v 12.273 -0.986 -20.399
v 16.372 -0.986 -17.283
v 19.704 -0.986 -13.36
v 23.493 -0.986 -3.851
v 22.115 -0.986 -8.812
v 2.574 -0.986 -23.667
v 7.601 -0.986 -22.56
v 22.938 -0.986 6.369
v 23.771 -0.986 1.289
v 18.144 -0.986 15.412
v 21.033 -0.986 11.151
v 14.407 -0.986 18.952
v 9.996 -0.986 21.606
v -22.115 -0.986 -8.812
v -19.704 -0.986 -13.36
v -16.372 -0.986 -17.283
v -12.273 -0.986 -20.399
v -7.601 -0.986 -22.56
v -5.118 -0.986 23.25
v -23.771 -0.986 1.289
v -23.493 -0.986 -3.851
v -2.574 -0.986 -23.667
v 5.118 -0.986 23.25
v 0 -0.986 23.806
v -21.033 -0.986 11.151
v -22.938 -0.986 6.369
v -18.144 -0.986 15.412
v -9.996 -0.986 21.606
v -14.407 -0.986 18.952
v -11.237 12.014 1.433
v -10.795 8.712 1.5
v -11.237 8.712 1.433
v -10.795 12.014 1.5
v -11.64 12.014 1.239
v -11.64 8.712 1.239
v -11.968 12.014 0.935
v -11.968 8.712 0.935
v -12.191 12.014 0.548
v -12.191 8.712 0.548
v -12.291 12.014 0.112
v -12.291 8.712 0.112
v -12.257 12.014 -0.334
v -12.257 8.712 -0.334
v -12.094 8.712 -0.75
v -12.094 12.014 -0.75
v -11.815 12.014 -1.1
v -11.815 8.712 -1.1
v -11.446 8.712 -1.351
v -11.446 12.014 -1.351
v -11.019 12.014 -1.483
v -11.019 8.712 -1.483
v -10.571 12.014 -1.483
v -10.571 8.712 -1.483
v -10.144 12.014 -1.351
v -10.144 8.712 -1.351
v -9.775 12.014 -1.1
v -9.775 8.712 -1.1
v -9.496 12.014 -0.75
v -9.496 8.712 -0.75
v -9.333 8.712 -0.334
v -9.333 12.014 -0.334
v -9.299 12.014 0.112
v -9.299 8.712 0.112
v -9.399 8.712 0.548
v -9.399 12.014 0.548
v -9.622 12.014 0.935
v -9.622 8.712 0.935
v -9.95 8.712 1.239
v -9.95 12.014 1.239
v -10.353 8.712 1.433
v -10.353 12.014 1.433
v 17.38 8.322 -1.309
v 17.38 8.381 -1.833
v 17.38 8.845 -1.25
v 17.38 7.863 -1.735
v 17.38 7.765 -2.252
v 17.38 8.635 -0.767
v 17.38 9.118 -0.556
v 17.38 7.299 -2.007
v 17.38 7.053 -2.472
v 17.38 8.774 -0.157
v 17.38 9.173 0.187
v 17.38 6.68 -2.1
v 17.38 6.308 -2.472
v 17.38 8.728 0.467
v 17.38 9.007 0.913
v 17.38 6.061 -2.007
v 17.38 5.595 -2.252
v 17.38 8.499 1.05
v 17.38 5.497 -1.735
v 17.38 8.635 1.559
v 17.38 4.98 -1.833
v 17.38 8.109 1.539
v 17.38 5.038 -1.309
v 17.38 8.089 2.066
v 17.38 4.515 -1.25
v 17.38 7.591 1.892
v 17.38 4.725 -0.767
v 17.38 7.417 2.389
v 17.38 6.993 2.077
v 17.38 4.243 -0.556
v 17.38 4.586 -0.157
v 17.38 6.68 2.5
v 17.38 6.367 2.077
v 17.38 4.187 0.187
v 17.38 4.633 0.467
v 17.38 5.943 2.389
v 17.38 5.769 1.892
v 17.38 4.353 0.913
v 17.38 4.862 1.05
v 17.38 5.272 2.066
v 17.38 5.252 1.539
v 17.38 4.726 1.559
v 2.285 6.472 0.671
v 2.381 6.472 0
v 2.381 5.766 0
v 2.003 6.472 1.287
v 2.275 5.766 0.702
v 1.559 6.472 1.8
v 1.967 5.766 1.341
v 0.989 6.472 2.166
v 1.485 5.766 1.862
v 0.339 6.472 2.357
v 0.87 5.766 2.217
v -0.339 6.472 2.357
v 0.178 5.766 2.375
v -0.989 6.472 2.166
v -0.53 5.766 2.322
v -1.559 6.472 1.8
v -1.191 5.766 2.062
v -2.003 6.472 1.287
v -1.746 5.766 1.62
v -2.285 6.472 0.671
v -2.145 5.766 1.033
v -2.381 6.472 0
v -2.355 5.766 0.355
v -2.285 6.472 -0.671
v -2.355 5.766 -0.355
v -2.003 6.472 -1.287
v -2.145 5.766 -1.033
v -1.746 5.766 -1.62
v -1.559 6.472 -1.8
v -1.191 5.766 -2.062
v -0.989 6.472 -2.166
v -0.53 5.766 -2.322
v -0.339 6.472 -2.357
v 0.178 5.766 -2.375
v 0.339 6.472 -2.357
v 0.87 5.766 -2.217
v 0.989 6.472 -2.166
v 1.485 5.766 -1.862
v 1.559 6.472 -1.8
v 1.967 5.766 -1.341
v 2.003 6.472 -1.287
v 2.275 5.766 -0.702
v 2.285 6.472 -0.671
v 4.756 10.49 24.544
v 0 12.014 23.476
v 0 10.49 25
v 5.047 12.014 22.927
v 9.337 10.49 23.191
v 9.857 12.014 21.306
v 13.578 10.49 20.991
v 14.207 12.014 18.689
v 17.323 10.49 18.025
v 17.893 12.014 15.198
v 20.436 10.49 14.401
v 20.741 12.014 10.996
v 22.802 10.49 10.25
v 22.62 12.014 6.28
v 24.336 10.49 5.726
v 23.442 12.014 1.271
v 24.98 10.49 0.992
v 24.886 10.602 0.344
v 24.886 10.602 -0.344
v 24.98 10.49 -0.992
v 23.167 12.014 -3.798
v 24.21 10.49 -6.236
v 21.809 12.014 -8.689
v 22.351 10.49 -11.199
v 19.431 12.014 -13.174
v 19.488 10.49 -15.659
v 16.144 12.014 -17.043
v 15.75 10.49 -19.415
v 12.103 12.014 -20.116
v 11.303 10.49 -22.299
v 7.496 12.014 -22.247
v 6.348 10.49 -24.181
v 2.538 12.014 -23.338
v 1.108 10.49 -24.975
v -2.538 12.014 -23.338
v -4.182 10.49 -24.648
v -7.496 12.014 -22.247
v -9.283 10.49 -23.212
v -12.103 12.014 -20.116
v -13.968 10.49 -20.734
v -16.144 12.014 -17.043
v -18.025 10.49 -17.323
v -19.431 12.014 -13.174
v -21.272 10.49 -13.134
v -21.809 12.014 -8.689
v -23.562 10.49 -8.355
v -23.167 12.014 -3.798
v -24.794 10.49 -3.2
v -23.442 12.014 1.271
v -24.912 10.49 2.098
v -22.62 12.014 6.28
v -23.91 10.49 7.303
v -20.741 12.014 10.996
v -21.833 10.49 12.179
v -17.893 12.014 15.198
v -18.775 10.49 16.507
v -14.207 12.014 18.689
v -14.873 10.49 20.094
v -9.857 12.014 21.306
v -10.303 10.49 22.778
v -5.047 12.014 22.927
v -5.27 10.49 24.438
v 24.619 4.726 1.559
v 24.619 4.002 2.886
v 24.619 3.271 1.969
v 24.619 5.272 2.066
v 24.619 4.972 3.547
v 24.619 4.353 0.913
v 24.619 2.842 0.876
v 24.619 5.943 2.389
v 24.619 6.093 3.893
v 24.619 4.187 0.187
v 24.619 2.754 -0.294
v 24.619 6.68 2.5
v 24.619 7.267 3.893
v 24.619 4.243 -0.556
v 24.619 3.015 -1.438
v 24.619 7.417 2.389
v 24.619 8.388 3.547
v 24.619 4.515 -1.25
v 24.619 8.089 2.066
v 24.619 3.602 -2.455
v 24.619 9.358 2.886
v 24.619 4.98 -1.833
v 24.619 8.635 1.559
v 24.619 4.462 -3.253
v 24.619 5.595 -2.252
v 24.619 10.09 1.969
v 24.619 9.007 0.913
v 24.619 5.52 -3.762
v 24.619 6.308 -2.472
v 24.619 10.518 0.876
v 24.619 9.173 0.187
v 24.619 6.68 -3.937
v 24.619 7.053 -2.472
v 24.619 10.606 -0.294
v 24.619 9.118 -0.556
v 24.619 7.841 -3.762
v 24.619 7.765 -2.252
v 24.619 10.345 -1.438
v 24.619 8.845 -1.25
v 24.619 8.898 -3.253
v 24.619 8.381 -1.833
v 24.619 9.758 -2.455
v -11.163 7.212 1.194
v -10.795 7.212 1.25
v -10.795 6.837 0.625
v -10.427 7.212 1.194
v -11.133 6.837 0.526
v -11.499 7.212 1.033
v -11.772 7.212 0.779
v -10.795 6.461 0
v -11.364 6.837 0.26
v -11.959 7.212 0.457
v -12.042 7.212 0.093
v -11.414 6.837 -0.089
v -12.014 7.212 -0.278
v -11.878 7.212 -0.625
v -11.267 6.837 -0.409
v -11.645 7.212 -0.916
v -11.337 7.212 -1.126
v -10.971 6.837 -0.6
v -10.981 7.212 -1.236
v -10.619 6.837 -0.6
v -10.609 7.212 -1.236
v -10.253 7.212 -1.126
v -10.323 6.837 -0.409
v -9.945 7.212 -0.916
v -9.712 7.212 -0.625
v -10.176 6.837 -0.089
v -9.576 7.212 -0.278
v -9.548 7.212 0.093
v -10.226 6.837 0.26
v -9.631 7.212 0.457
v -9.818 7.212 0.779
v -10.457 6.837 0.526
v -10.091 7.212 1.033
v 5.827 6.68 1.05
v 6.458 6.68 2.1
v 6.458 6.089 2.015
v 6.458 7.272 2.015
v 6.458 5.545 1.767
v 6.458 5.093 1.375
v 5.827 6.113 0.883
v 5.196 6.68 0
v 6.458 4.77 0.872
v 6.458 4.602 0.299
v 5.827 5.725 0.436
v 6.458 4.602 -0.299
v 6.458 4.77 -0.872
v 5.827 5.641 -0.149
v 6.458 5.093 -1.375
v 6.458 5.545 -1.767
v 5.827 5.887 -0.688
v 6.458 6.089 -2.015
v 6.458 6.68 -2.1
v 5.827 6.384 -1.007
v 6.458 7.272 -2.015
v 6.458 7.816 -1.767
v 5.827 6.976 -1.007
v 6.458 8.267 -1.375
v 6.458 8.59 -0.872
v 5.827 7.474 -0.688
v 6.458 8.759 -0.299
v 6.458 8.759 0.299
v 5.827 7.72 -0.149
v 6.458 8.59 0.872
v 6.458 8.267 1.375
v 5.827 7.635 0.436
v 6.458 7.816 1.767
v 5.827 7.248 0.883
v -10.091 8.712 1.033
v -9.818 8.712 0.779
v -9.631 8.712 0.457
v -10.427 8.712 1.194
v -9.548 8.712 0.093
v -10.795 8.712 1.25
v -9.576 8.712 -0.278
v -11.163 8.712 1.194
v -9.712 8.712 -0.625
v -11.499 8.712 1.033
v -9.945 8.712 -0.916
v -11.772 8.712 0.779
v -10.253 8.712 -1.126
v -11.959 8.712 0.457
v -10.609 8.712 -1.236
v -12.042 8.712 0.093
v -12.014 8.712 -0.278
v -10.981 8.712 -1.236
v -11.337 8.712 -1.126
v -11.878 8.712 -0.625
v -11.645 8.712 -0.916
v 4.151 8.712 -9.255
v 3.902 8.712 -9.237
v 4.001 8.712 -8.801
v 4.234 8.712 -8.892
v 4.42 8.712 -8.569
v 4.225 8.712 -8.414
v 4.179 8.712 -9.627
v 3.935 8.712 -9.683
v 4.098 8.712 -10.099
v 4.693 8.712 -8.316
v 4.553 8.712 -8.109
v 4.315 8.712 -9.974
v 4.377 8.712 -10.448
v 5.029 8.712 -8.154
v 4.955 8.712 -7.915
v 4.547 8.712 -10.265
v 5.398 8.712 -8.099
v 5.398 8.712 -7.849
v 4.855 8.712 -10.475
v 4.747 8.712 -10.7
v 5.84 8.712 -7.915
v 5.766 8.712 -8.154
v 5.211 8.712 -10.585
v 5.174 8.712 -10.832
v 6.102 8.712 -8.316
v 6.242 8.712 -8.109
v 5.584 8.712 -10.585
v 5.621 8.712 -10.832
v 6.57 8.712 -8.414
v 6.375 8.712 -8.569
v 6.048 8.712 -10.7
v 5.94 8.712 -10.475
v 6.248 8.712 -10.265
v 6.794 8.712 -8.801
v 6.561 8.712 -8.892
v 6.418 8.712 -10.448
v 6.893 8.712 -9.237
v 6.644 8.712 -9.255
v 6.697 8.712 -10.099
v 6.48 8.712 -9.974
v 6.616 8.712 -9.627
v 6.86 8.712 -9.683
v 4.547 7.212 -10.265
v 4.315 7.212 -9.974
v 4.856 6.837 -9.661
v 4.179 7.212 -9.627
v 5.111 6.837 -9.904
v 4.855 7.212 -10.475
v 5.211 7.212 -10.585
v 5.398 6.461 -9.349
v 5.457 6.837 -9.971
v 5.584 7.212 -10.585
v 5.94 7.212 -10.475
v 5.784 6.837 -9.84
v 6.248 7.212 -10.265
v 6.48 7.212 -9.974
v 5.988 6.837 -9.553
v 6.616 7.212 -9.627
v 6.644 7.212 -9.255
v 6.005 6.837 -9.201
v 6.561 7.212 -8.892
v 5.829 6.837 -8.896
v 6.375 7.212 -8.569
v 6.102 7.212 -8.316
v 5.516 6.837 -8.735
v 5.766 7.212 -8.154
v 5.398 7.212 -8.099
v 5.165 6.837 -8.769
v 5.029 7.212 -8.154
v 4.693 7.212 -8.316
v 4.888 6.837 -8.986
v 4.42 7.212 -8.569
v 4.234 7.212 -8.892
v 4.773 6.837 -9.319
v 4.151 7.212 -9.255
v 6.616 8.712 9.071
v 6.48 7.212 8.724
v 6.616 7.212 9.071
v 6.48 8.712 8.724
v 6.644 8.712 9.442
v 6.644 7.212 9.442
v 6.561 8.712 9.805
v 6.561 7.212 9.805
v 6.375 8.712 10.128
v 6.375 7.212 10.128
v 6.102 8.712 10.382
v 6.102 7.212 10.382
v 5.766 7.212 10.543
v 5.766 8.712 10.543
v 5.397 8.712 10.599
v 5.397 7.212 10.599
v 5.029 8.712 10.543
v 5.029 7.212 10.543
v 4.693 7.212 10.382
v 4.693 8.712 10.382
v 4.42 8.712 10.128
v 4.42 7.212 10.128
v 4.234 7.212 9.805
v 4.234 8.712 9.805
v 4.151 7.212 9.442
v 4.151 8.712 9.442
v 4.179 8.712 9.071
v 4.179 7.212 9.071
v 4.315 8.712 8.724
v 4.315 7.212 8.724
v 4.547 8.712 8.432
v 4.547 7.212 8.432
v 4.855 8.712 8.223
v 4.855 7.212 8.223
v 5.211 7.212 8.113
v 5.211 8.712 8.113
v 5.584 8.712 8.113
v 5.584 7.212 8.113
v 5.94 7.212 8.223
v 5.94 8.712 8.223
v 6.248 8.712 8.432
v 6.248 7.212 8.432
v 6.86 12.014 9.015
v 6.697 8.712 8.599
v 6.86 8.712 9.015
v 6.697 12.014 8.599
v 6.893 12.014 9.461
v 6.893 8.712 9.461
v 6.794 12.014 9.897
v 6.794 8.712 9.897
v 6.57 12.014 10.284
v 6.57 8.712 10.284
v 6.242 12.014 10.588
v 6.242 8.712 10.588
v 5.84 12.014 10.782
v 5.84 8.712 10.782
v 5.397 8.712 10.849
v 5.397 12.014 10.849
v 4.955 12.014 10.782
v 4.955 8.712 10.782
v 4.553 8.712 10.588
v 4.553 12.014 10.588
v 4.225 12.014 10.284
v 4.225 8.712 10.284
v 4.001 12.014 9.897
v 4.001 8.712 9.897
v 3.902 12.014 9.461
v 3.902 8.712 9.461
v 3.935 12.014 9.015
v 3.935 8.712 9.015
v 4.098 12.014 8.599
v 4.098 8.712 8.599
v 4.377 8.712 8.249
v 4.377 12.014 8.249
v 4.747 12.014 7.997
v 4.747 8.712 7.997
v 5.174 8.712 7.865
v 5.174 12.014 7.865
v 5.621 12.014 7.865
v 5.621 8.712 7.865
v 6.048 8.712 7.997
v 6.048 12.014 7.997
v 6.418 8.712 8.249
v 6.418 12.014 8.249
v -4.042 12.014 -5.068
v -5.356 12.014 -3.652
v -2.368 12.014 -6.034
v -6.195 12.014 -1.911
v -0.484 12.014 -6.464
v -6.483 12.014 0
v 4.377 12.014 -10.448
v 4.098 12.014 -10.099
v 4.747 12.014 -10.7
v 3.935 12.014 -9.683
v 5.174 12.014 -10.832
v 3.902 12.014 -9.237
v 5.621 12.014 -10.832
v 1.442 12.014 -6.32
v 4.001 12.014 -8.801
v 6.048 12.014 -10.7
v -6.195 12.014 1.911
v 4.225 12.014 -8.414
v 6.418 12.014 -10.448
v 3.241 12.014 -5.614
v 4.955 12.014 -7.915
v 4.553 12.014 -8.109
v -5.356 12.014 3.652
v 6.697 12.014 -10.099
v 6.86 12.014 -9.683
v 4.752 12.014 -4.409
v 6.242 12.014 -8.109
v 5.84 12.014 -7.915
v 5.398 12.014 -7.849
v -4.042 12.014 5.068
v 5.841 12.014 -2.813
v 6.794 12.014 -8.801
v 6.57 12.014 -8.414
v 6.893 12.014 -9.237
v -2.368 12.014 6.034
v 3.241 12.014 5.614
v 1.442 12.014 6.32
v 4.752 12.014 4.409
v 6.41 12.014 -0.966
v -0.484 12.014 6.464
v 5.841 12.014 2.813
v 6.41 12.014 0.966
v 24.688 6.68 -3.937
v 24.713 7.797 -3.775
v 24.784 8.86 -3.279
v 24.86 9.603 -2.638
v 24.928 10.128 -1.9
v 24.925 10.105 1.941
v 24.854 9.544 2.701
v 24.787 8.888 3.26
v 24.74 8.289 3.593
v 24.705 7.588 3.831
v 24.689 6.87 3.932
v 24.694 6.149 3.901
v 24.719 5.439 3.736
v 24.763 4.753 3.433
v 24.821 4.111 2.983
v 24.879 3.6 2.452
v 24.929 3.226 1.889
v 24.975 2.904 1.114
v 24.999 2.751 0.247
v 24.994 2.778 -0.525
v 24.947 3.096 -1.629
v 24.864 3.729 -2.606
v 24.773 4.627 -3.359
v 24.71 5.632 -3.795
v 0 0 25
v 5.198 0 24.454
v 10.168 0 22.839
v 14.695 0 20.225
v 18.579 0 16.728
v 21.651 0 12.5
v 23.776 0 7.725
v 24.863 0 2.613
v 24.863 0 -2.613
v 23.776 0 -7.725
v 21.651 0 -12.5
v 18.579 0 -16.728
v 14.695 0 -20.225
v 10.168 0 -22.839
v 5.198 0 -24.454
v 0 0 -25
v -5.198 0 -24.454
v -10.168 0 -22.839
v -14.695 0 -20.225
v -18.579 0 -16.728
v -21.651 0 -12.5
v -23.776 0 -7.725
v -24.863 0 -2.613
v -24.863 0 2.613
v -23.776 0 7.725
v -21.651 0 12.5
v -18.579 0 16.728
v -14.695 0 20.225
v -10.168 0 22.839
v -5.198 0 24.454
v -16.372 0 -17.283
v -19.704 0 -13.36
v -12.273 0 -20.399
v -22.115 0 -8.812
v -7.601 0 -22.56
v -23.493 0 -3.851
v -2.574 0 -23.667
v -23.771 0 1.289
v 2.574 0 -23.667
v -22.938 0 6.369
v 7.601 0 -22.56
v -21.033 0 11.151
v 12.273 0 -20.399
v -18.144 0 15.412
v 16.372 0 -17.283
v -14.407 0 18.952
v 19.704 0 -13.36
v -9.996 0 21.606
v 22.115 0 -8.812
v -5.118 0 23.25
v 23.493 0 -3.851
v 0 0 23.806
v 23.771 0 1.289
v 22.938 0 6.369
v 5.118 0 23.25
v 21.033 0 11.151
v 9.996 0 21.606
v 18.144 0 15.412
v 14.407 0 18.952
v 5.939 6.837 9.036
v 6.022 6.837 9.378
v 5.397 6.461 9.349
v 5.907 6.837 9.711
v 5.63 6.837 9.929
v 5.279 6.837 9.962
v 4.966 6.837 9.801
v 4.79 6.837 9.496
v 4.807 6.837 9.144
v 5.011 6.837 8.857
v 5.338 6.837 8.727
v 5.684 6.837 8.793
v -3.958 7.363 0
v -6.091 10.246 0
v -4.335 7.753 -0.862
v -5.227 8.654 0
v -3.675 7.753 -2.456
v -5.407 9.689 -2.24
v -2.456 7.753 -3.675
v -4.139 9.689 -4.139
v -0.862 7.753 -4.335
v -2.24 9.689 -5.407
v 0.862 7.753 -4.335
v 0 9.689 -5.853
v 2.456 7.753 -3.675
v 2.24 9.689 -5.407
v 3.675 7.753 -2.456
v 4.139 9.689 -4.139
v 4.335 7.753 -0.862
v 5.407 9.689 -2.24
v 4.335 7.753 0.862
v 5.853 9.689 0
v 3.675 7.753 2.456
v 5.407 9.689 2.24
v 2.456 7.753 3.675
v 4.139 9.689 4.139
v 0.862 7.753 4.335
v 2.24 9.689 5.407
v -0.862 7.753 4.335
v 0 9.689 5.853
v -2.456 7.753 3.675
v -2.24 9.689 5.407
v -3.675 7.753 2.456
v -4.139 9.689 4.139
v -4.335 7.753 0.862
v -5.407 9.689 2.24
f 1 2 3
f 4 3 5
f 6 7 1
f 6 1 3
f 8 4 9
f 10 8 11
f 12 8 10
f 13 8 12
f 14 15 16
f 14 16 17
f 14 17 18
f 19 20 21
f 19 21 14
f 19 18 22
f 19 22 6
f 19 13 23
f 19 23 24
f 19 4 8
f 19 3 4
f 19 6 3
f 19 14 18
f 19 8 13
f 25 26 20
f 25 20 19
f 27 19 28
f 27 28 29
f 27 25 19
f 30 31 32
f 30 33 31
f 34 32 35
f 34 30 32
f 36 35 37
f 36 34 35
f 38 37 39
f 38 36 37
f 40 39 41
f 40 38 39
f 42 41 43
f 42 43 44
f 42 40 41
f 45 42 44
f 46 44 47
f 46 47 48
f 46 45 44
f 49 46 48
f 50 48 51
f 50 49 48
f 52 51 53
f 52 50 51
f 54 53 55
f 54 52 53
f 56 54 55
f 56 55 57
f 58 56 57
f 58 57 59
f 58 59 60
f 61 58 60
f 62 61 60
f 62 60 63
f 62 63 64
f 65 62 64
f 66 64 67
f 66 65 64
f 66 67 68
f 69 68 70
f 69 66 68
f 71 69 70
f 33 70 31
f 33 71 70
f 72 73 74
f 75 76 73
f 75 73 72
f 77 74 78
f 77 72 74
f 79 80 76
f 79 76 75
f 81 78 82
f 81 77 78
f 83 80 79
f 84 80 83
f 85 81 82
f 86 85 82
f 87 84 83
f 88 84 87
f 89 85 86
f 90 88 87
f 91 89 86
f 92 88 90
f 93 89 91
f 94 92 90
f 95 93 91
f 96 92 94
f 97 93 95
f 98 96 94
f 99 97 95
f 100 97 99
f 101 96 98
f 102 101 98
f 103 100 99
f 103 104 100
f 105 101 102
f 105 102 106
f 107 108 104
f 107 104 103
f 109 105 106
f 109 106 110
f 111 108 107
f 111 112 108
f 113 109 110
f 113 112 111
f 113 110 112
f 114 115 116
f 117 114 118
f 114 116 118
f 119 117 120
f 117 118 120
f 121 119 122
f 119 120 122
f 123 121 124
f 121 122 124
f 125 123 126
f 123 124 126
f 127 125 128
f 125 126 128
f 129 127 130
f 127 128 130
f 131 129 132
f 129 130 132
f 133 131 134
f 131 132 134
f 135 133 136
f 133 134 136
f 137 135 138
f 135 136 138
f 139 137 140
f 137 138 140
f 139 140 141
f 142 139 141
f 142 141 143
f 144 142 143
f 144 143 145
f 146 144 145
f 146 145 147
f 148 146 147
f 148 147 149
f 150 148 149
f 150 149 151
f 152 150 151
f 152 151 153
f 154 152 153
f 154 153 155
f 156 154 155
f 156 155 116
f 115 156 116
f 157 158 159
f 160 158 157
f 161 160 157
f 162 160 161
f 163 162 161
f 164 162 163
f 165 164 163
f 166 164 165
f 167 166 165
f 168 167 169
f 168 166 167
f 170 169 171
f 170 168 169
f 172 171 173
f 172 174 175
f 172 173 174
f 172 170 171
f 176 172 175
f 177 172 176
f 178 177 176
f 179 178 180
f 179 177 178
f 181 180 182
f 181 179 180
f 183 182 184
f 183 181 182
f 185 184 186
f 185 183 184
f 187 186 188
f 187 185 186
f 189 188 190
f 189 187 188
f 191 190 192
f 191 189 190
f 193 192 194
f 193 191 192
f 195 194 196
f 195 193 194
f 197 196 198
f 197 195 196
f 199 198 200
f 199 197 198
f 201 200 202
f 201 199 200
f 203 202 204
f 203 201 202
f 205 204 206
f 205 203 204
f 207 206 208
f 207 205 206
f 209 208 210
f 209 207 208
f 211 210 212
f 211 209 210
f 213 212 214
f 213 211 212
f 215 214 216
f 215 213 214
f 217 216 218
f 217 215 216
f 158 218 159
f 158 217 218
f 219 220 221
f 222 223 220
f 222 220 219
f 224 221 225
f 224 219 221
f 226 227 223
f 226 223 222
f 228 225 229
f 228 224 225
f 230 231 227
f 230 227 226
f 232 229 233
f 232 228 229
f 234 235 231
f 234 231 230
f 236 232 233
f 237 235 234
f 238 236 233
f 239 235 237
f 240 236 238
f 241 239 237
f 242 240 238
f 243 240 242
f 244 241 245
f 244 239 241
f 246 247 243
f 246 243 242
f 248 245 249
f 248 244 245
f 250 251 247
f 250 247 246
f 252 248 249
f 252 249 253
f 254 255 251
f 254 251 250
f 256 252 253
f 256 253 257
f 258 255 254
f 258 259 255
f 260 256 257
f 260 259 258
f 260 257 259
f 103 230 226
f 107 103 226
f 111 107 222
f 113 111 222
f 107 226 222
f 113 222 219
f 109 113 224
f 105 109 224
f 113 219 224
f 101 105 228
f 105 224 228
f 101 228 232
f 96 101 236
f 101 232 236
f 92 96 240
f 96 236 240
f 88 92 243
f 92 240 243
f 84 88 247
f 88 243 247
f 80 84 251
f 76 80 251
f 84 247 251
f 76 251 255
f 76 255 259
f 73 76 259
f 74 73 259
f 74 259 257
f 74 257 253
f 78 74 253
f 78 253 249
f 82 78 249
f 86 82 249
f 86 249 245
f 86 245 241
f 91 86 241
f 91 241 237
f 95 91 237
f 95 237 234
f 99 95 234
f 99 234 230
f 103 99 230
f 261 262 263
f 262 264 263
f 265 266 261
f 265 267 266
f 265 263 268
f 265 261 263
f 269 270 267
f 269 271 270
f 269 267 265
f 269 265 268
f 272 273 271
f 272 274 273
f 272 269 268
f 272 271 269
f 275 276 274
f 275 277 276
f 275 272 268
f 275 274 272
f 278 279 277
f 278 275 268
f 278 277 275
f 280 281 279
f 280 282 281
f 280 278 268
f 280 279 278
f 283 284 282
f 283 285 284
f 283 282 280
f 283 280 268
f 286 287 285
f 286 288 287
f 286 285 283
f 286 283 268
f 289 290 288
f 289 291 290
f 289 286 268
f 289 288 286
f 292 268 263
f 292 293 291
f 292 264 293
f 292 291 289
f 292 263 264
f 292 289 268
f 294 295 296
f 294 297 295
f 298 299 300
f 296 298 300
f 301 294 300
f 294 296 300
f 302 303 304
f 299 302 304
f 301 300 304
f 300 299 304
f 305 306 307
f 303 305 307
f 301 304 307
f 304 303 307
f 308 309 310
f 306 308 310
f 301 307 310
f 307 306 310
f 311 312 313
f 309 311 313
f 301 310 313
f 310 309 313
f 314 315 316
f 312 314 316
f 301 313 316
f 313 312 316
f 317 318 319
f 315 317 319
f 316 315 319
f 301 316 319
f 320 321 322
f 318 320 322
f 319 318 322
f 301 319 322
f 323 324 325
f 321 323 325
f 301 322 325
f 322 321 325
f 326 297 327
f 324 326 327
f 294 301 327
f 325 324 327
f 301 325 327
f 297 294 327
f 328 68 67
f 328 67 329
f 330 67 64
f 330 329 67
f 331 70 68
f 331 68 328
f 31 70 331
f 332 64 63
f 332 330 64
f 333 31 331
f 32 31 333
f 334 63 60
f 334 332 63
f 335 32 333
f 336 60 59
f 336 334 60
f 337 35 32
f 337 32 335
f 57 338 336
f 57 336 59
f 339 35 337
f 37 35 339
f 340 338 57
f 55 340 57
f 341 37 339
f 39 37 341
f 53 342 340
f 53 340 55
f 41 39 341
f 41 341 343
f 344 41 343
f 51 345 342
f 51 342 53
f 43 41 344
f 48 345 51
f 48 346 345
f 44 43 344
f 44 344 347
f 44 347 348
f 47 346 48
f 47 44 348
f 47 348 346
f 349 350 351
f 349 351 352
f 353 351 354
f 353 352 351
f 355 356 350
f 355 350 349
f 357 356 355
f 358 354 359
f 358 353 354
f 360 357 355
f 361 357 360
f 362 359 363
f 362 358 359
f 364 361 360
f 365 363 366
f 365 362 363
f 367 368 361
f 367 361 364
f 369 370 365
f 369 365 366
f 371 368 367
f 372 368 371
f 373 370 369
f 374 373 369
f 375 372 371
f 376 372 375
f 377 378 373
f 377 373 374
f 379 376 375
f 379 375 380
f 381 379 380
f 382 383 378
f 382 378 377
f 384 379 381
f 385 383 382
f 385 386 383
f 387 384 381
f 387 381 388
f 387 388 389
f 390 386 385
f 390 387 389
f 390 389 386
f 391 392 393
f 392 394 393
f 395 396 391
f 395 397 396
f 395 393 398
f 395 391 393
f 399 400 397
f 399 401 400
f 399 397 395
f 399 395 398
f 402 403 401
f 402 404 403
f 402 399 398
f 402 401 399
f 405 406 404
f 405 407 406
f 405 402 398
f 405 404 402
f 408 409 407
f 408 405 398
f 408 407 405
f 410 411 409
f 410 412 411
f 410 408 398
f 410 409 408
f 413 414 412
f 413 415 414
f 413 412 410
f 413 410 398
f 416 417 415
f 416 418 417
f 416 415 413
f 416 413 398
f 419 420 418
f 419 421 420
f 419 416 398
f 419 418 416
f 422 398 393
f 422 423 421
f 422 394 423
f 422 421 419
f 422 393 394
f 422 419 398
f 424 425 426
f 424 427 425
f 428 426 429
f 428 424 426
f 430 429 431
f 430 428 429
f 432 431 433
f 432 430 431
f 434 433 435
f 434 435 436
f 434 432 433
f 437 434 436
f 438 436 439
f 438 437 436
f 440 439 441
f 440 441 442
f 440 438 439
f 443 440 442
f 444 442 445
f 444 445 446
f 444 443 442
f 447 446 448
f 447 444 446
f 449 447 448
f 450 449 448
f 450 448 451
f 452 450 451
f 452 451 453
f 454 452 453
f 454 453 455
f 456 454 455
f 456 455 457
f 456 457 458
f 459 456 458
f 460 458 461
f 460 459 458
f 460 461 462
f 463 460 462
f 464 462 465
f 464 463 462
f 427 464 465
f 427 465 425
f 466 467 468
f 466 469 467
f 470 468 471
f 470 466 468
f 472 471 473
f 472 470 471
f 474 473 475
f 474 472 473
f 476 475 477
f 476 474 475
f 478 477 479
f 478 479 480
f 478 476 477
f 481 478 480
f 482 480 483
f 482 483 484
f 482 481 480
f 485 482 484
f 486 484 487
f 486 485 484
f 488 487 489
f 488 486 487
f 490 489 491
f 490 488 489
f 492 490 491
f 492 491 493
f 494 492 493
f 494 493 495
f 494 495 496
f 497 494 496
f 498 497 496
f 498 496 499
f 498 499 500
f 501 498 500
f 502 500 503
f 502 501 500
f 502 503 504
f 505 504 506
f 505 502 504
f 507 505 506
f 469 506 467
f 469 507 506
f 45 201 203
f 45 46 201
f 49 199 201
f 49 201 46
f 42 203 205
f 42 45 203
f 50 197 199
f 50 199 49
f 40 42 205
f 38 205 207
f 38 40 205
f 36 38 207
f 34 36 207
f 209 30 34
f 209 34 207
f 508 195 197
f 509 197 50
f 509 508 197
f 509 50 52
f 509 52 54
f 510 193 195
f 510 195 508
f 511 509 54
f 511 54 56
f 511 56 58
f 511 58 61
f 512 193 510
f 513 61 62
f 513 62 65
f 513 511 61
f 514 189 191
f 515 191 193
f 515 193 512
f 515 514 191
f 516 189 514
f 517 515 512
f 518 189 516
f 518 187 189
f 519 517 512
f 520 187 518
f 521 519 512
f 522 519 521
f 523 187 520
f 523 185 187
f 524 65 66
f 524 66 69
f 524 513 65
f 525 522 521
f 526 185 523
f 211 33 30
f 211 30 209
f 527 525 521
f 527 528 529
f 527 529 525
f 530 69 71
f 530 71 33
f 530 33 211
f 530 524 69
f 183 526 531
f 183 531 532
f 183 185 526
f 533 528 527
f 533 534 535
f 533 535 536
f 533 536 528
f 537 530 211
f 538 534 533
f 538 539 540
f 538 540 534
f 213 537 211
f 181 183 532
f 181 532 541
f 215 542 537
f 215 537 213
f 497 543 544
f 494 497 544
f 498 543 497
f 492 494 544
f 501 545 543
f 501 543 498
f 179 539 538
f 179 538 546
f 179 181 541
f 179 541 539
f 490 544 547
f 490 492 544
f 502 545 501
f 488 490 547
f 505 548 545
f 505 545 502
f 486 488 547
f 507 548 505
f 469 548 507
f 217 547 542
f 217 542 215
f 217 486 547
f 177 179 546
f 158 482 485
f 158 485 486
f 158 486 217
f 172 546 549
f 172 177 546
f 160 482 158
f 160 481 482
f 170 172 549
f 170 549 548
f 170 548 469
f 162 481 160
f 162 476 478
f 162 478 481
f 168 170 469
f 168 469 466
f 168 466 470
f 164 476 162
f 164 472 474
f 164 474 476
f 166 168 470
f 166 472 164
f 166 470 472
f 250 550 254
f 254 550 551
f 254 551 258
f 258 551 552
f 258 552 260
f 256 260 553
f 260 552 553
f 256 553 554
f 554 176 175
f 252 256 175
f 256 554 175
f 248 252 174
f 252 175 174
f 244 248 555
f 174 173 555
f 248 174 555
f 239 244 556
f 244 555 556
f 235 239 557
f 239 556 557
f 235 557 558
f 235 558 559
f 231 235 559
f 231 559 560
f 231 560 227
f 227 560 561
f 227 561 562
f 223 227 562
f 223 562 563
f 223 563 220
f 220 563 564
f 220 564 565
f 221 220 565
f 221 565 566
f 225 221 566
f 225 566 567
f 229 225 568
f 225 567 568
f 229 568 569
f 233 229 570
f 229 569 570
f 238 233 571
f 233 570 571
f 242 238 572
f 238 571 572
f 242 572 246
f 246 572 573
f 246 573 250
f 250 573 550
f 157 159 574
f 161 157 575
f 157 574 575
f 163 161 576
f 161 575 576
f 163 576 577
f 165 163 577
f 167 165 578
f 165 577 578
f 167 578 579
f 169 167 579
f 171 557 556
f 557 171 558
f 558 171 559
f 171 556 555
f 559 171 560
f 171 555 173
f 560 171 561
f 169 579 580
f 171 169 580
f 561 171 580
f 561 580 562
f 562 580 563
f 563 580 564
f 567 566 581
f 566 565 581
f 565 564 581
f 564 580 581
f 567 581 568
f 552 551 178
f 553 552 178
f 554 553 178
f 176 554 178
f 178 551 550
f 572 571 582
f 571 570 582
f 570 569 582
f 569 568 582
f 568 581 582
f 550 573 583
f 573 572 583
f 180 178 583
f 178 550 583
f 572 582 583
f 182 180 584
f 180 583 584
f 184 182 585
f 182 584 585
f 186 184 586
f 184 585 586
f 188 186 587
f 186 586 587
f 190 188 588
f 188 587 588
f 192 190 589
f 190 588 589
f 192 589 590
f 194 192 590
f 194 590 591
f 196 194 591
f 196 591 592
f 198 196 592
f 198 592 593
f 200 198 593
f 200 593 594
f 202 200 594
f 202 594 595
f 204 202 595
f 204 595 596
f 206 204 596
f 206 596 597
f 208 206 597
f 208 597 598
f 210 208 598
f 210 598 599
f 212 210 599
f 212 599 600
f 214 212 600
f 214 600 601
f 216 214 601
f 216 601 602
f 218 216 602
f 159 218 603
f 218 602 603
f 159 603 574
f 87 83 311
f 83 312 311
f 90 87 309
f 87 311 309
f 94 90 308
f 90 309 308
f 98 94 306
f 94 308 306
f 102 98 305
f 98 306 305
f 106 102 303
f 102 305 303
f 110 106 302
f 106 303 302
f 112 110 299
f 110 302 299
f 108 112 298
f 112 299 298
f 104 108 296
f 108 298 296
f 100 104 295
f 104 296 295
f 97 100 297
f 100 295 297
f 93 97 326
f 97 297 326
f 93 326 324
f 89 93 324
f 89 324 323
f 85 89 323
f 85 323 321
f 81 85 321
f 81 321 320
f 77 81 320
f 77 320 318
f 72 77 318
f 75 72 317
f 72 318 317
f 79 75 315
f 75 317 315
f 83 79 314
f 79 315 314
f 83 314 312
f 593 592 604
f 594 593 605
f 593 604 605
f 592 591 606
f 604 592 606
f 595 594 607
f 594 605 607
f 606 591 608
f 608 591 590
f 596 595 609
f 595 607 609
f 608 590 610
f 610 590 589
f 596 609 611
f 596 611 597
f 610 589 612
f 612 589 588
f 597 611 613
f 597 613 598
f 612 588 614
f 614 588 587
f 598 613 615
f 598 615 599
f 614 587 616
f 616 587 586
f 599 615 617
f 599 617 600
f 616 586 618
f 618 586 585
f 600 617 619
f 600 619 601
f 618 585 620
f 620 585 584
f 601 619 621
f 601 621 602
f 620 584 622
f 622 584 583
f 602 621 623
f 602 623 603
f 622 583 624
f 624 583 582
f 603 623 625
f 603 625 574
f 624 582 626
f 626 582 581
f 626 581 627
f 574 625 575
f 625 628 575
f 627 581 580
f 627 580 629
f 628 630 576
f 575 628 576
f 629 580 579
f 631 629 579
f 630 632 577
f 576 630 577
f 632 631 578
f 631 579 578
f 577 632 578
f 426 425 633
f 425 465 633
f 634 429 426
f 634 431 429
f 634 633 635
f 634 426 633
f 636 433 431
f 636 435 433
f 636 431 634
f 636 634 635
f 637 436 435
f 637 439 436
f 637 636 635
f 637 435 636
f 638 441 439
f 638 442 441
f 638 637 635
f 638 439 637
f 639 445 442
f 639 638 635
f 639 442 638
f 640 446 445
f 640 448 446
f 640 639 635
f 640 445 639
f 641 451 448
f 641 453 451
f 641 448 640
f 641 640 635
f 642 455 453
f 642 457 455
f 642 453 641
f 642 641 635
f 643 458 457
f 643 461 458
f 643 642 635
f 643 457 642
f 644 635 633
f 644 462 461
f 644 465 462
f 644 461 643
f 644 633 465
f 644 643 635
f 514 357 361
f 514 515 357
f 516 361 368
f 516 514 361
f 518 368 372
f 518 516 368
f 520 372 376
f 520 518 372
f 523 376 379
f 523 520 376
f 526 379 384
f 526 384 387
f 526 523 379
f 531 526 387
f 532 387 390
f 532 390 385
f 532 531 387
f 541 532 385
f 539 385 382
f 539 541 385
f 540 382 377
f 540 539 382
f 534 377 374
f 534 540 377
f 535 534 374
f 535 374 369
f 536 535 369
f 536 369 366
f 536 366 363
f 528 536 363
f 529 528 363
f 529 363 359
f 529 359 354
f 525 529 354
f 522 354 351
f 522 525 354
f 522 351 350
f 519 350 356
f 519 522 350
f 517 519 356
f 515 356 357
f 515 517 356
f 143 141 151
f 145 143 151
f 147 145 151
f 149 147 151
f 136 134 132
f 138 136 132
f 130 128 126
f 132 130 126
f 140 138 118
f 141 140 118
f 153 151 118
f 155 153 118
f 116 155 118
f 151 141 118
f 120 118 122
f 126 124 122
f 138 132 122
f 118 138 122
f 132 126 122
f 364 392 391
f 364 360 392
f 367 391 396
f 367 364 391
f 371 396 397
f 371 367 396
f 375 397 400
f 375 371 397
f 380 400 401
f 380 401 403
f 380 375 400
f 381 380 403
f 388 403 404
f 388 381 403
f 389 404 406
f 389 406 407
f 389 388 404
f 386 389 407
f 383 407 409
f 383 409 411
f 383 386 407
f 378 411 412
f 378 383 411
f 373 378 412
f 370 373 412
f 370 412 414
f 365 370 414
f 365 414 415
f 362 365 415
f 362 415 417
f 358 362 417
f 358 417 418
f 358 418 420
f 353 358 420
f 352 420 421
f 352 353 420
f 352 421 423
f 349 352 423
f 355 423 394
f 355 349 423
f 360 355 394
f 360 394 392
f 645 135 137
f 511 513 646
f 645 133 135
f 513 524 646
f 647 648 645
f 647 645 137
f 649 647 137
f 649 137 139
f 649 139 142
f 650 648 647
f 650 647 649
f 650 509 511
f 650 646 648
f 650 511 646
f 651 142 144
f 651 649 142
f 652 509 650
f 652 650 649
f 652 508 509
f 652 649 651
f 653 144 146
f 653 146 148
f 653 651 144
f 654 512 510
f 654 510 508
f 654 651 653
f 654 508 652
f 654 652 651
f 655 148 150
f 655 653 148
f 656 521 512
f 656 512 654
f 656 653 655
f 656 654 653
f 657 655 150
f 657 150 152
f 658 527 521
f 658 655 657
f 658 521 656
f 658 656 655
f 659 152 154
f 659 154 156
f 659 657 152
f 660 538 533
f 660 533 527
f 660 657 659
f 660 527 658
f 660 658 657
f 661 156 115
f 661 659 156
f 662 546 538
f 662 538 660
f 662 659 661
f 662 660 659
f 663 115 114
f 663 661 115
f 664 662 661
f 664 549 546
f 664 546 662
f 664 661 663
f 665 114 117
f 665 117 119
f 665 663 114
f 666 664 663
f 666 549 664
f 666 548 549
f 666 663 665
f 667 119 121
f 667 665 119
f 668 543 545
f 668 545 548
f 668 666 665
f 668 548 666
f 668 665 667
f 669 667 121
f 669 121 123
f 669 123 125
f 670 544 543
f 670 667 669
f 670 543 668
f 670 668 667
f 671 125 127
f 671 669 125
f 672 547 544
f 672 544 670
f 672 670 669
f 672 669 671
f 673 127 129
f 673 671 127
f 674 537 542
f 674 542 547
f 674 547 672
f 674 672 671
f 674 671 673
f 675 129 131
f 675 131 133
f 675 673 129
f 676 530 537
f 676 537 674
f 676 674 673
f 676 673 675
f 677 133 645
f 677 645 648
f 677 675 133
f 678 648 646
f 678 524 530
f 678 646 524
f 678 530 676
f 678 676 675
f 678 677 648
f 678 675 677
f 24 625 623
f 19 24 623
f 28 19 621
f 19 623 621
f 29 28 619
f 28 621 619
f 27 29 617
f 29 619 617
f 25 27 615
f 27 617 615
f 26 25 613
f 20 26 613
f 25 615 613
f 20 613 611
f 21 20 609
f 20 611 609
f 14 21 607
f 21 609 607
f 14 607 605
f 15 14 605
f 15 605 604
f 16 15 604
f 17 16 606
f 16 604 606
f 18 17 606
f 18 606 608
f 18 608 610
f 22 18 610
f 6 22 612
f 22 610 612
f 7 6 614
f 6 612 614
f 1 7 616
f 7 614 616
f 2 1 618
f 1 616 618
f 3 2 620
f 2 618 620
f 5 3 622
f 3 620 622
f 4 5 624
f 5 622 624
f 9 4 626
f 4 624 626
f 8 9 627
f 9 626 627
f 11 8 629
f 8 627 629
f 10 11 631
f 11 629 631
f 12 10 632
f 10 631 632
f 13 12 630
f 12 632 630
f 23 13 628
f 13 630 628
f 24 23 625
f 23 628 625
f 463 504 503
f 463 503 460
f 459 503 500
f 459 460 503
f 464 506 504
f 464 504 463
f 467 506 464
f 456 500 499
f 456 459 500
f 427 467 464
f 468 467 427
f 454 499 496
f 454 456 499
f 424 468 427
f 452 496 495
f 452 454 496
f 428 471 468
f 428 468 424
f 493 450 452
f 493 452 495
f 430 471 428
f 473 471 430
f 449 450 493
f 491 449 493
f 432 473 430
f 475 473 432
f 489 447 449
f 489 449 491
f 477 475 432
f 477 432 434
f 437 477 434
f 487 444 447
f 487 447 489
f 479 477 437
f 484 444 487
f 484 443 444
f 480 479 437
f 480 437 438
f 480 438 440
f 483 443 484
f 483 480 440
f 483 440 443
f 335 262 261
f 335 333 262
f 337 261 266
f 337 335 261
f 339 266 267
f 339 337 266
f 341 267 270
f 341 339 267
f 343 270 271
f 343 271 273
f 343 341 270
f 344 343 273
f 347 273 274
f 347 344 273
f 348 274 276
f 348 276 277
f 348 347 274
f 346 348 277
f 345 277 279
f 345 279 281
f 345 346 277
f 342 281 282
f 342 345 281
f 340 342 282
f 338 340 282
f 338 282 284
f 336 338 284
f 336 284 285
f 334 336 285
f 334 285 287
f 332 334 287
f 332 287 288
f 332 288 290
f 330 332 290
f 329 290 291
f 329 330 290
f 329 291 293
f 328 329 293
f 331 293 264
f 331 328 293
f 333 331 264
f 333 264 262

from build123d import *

# Parameters (mm, degrees)
SKETCH1_R                          = 25
EXTRUDE1_DEPTH                     = 12.0142
CHAMFER1_SIZE                      = 1.524
F_3_16_0_1875_DIAMETER_HOLE1_D     = 4.7625
F_3_16_0_1875_DIAMETER_HOLE1_DEPTH = 6.2484
SKETCH5_R                          = 23.8062
EXTRUDE2_DEPTH                     = 0.98552
M5X0_8_TAPPED_HOLE1_D              = 4.2
M5X0_8_TAPPED_HOLE1_DEPTH          = 18.542
M5X0_8_TAPPED_HOLE1_CBORE_D        = 5
M5X0_8_TAPPED_HOLE1_CBORE_DEPTH    = 7.62
M5X0_8_TAPPED_HOLE1_TIP            = 1.2618073
CIRPATTERN1_COUNT                  = 3
SKETCH10_R                         = 3.937
CUT_EXTRUDE3_DEPTH                 = 0.381


with BuildPart() as part:
    # Sketch1 → Extrude1 (new body)
    with BuildSketch(Plane(origin=(0, 0, 0), x_dir=(1, 0, 0), z_dir=(0, 1, 0))):
        with Locations(Location((0, 0, 0), (0, 0, 270))):  # turned: the seam where the file's is
            Circle(SKETCH1_R)
    extrude(amount=EXTRUDE1_DEPTH)

    # Chamfer1
    chamfer1_edges = [part.edges().sort_by_distance(p)[0] for p in [
        (0, 12.0142, -25),
    ]]
    chamfer(chamfer1_edges, length=CHAMFER1_SIZE)

    # Sketch2 → Cut-Revolve1 (revolve, cut)
    with BuildSketch(Plane.XY):
        with BuildLine():
            Line((0, 19.0246), (0, 6.0198))
            ThreePointArc((0, 6.0198), (-6.5024, 12.5222), (0, 19.0246))
        make_face()
    revolve(axis=Axis((0, 19.0246, 0), (0, -1, 0)), mode=Mode.SUBTRACT)

    # 3_16 _0.1875_ Diameter Hole1
    with Locations(Plane(origin=(0, 12.0142, 0), x_dir=(-1, 0, 0), z_dir=(0, 1, 0))):
        with Locations((0, 0)):
            Hole(F_3_16_0_1875_DIAMETER_HOLE1_D / 2, depth=F_3_16_0_1875_DIAMETER_HOLE1_DEPTH)

    # Sketch5 → Extrude2 (add)
    with BuildSketch(Plane.XZ):
        with Locations(Location((0, 0, 0), (0, 0, 90))):  # turned: the seam where the file's is
            Circle(SKETCH5_R)
    extrude(amount=EXTRUDE2_DEPTH)

    # M5x0.8 Tapped Hole1
    with Locations(Plane(origin=(25, 6.6802, 0), x_dir=(0, 0, 1), z_dir=(1, 0, 0))):
        with Locations((0, 0)):
            CounterBoreHole(M5X0_8_TAPPED_HOLE1_D / 2, M5X0_8_TAPPED_HOLE1_CBORE_D / 2, M5X0_8_TAPPED_HOLE1_CBORE_DEPTH, depth=M5X0_8_TAPPED_HOLE1_DEPTH)
            with Locations((0, 0, -(M5X0_8_TAPPED_HOLE1_DEPTH + M5X0_8_TAPPED_HOLE1_TIP / 2))):  # 118° drill point
                Cone(0, M5X0_8_TAPPED_HOLE1_D / 2, M5X0_8_TAPPED_HOLE1_TIP, mode=Mode.SUBTRACT)

    # Sketch8 → M3x0.5 Tapped Hole1 (revolve, cut)
    with BuildSketch(Plane(origin=(-10.795, 12.0142, 0), x_dir=(0, 0, 1), z_dir=(1, 0, 0))):
        Polygon((0, 0), (0, 5.553072774), (1.25, 4.801997), (1.25, 3.302), (1.5, 3.302), (1.5, 0), align=None)
    m3x0_5_tapped_hole1 = revolve(axis=Axis((-10.795, 18.3642, 0), (0, -1, 0)), mode=Mode.SUBTRACT)

    # CirPattern1: M3x0.5 Tapped Hole1 ×3 about axis
    cirpattern1_axis = Axis((0, 0, 0), (0, 1, 0))
    for i in range(1, CIRPATTERN1_COUNT):
        add(m3x0_5_tapped_hole1.rotate(cirpattern1_axis, i * 360 / CIRPATTERN1_COUNT), mode=Mode.SUBTRACT)

    # Sketch10 → Cut-Extrude3 (cut)
    with BuildSketch(Plane(origin=(25, 5.2451, 0), x_dir=(0, 0, 1), z_dir=(1, 0, 0))):
        with Locations(Location((0, -1.4351, 0), (0, 0, 180))):  # turned: the seam where the file's is
            Circle(SKETCH10_R)
    extrude(amount=-CUT_EXTRUDE3_DEPTH, mode=Mode.SUBTRACT)


solid = part.part
